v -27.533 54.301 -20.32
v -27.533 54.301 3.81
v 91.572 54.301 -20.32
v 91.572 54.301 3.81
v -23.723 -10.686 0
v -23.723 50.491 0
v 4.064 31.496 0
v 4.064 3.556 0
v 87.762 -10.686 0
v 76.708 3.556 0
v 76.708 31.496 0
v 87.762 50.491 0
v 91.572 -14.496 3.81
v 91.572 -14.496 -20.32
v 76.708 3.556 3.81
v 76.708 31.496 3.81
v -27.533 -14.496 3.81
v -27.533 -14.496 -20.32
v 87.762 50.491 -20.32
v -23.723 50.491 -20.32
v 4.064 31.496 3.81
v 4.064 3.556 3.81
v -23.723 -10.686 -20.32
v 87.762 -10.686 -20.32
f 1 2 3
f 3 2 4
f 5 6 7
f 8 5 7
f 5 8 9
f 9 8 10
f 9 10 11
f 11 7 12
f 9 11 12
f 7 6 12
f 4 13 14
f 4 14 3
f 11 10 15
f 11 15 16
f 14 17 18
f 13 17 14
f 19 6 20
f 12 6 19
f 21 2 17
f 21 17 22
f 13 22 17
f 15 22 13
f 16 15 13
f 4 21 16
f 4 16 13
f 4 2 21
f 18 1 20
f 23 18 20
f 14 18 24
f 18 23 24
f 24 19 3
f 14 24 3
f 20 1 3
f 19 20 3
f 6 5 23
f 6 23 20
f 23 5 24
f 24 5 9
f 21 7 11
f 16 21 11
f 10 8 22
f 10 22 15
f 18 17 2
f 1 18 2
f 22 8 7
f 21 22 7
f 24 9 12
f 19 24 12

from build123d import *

# Parameters (mm, degrees)
SKETCH1_W           = 119.105009205
SKETCH1_H           = 68.796475466
SKETCH1_W_2         = 72.644
SKETCH1_H_2         = 27.94
BOSS_EXTRUDE2_DEPTH = 3.81
SKETCH2_W           = 119.105009205
SKETCH2_H           = 68.796475466
SKETCH2_W_2         = 111.485009205
SKETCH2_H_2         = 61.176475466
BOSS_EXTRUDE3_DEPTH = 20.32


with BuildPart() as part:
    # Sketch1 → Boss-Extrude2 (new body)
    with BuildSketch(Plane.XY):
        with Locations((32.019529699, 19.90260555)):
            Rectangle(SKETCH1_W, SKETCH1_H)
        with Locations((40.386, 17.526)):
            Rectangle(SKETCH1_W_2, SKETCH1_H_2, mode=Mode.SUBTRACT)
    extrude(amount=BOSS_EXTRUDE2_DEPTH)

    # Sketch2 → Boss-Extrude3 (add)
    with BuildSketch(Plane.XY):
        with Locations((32.019529699, 19.90260555)):
            Rectangle(SKETCH2_W, SKETCH2_H)
        with Locations((32.019529699, 19.90260555)):
            Rectangle(SKETCH2_W_2, SKETCH2_H_2, mode=Mode.SUBTRACT)
    extrude(amount=-BOSS_EXTRUDE3_DEPTH)


solid = part.part
